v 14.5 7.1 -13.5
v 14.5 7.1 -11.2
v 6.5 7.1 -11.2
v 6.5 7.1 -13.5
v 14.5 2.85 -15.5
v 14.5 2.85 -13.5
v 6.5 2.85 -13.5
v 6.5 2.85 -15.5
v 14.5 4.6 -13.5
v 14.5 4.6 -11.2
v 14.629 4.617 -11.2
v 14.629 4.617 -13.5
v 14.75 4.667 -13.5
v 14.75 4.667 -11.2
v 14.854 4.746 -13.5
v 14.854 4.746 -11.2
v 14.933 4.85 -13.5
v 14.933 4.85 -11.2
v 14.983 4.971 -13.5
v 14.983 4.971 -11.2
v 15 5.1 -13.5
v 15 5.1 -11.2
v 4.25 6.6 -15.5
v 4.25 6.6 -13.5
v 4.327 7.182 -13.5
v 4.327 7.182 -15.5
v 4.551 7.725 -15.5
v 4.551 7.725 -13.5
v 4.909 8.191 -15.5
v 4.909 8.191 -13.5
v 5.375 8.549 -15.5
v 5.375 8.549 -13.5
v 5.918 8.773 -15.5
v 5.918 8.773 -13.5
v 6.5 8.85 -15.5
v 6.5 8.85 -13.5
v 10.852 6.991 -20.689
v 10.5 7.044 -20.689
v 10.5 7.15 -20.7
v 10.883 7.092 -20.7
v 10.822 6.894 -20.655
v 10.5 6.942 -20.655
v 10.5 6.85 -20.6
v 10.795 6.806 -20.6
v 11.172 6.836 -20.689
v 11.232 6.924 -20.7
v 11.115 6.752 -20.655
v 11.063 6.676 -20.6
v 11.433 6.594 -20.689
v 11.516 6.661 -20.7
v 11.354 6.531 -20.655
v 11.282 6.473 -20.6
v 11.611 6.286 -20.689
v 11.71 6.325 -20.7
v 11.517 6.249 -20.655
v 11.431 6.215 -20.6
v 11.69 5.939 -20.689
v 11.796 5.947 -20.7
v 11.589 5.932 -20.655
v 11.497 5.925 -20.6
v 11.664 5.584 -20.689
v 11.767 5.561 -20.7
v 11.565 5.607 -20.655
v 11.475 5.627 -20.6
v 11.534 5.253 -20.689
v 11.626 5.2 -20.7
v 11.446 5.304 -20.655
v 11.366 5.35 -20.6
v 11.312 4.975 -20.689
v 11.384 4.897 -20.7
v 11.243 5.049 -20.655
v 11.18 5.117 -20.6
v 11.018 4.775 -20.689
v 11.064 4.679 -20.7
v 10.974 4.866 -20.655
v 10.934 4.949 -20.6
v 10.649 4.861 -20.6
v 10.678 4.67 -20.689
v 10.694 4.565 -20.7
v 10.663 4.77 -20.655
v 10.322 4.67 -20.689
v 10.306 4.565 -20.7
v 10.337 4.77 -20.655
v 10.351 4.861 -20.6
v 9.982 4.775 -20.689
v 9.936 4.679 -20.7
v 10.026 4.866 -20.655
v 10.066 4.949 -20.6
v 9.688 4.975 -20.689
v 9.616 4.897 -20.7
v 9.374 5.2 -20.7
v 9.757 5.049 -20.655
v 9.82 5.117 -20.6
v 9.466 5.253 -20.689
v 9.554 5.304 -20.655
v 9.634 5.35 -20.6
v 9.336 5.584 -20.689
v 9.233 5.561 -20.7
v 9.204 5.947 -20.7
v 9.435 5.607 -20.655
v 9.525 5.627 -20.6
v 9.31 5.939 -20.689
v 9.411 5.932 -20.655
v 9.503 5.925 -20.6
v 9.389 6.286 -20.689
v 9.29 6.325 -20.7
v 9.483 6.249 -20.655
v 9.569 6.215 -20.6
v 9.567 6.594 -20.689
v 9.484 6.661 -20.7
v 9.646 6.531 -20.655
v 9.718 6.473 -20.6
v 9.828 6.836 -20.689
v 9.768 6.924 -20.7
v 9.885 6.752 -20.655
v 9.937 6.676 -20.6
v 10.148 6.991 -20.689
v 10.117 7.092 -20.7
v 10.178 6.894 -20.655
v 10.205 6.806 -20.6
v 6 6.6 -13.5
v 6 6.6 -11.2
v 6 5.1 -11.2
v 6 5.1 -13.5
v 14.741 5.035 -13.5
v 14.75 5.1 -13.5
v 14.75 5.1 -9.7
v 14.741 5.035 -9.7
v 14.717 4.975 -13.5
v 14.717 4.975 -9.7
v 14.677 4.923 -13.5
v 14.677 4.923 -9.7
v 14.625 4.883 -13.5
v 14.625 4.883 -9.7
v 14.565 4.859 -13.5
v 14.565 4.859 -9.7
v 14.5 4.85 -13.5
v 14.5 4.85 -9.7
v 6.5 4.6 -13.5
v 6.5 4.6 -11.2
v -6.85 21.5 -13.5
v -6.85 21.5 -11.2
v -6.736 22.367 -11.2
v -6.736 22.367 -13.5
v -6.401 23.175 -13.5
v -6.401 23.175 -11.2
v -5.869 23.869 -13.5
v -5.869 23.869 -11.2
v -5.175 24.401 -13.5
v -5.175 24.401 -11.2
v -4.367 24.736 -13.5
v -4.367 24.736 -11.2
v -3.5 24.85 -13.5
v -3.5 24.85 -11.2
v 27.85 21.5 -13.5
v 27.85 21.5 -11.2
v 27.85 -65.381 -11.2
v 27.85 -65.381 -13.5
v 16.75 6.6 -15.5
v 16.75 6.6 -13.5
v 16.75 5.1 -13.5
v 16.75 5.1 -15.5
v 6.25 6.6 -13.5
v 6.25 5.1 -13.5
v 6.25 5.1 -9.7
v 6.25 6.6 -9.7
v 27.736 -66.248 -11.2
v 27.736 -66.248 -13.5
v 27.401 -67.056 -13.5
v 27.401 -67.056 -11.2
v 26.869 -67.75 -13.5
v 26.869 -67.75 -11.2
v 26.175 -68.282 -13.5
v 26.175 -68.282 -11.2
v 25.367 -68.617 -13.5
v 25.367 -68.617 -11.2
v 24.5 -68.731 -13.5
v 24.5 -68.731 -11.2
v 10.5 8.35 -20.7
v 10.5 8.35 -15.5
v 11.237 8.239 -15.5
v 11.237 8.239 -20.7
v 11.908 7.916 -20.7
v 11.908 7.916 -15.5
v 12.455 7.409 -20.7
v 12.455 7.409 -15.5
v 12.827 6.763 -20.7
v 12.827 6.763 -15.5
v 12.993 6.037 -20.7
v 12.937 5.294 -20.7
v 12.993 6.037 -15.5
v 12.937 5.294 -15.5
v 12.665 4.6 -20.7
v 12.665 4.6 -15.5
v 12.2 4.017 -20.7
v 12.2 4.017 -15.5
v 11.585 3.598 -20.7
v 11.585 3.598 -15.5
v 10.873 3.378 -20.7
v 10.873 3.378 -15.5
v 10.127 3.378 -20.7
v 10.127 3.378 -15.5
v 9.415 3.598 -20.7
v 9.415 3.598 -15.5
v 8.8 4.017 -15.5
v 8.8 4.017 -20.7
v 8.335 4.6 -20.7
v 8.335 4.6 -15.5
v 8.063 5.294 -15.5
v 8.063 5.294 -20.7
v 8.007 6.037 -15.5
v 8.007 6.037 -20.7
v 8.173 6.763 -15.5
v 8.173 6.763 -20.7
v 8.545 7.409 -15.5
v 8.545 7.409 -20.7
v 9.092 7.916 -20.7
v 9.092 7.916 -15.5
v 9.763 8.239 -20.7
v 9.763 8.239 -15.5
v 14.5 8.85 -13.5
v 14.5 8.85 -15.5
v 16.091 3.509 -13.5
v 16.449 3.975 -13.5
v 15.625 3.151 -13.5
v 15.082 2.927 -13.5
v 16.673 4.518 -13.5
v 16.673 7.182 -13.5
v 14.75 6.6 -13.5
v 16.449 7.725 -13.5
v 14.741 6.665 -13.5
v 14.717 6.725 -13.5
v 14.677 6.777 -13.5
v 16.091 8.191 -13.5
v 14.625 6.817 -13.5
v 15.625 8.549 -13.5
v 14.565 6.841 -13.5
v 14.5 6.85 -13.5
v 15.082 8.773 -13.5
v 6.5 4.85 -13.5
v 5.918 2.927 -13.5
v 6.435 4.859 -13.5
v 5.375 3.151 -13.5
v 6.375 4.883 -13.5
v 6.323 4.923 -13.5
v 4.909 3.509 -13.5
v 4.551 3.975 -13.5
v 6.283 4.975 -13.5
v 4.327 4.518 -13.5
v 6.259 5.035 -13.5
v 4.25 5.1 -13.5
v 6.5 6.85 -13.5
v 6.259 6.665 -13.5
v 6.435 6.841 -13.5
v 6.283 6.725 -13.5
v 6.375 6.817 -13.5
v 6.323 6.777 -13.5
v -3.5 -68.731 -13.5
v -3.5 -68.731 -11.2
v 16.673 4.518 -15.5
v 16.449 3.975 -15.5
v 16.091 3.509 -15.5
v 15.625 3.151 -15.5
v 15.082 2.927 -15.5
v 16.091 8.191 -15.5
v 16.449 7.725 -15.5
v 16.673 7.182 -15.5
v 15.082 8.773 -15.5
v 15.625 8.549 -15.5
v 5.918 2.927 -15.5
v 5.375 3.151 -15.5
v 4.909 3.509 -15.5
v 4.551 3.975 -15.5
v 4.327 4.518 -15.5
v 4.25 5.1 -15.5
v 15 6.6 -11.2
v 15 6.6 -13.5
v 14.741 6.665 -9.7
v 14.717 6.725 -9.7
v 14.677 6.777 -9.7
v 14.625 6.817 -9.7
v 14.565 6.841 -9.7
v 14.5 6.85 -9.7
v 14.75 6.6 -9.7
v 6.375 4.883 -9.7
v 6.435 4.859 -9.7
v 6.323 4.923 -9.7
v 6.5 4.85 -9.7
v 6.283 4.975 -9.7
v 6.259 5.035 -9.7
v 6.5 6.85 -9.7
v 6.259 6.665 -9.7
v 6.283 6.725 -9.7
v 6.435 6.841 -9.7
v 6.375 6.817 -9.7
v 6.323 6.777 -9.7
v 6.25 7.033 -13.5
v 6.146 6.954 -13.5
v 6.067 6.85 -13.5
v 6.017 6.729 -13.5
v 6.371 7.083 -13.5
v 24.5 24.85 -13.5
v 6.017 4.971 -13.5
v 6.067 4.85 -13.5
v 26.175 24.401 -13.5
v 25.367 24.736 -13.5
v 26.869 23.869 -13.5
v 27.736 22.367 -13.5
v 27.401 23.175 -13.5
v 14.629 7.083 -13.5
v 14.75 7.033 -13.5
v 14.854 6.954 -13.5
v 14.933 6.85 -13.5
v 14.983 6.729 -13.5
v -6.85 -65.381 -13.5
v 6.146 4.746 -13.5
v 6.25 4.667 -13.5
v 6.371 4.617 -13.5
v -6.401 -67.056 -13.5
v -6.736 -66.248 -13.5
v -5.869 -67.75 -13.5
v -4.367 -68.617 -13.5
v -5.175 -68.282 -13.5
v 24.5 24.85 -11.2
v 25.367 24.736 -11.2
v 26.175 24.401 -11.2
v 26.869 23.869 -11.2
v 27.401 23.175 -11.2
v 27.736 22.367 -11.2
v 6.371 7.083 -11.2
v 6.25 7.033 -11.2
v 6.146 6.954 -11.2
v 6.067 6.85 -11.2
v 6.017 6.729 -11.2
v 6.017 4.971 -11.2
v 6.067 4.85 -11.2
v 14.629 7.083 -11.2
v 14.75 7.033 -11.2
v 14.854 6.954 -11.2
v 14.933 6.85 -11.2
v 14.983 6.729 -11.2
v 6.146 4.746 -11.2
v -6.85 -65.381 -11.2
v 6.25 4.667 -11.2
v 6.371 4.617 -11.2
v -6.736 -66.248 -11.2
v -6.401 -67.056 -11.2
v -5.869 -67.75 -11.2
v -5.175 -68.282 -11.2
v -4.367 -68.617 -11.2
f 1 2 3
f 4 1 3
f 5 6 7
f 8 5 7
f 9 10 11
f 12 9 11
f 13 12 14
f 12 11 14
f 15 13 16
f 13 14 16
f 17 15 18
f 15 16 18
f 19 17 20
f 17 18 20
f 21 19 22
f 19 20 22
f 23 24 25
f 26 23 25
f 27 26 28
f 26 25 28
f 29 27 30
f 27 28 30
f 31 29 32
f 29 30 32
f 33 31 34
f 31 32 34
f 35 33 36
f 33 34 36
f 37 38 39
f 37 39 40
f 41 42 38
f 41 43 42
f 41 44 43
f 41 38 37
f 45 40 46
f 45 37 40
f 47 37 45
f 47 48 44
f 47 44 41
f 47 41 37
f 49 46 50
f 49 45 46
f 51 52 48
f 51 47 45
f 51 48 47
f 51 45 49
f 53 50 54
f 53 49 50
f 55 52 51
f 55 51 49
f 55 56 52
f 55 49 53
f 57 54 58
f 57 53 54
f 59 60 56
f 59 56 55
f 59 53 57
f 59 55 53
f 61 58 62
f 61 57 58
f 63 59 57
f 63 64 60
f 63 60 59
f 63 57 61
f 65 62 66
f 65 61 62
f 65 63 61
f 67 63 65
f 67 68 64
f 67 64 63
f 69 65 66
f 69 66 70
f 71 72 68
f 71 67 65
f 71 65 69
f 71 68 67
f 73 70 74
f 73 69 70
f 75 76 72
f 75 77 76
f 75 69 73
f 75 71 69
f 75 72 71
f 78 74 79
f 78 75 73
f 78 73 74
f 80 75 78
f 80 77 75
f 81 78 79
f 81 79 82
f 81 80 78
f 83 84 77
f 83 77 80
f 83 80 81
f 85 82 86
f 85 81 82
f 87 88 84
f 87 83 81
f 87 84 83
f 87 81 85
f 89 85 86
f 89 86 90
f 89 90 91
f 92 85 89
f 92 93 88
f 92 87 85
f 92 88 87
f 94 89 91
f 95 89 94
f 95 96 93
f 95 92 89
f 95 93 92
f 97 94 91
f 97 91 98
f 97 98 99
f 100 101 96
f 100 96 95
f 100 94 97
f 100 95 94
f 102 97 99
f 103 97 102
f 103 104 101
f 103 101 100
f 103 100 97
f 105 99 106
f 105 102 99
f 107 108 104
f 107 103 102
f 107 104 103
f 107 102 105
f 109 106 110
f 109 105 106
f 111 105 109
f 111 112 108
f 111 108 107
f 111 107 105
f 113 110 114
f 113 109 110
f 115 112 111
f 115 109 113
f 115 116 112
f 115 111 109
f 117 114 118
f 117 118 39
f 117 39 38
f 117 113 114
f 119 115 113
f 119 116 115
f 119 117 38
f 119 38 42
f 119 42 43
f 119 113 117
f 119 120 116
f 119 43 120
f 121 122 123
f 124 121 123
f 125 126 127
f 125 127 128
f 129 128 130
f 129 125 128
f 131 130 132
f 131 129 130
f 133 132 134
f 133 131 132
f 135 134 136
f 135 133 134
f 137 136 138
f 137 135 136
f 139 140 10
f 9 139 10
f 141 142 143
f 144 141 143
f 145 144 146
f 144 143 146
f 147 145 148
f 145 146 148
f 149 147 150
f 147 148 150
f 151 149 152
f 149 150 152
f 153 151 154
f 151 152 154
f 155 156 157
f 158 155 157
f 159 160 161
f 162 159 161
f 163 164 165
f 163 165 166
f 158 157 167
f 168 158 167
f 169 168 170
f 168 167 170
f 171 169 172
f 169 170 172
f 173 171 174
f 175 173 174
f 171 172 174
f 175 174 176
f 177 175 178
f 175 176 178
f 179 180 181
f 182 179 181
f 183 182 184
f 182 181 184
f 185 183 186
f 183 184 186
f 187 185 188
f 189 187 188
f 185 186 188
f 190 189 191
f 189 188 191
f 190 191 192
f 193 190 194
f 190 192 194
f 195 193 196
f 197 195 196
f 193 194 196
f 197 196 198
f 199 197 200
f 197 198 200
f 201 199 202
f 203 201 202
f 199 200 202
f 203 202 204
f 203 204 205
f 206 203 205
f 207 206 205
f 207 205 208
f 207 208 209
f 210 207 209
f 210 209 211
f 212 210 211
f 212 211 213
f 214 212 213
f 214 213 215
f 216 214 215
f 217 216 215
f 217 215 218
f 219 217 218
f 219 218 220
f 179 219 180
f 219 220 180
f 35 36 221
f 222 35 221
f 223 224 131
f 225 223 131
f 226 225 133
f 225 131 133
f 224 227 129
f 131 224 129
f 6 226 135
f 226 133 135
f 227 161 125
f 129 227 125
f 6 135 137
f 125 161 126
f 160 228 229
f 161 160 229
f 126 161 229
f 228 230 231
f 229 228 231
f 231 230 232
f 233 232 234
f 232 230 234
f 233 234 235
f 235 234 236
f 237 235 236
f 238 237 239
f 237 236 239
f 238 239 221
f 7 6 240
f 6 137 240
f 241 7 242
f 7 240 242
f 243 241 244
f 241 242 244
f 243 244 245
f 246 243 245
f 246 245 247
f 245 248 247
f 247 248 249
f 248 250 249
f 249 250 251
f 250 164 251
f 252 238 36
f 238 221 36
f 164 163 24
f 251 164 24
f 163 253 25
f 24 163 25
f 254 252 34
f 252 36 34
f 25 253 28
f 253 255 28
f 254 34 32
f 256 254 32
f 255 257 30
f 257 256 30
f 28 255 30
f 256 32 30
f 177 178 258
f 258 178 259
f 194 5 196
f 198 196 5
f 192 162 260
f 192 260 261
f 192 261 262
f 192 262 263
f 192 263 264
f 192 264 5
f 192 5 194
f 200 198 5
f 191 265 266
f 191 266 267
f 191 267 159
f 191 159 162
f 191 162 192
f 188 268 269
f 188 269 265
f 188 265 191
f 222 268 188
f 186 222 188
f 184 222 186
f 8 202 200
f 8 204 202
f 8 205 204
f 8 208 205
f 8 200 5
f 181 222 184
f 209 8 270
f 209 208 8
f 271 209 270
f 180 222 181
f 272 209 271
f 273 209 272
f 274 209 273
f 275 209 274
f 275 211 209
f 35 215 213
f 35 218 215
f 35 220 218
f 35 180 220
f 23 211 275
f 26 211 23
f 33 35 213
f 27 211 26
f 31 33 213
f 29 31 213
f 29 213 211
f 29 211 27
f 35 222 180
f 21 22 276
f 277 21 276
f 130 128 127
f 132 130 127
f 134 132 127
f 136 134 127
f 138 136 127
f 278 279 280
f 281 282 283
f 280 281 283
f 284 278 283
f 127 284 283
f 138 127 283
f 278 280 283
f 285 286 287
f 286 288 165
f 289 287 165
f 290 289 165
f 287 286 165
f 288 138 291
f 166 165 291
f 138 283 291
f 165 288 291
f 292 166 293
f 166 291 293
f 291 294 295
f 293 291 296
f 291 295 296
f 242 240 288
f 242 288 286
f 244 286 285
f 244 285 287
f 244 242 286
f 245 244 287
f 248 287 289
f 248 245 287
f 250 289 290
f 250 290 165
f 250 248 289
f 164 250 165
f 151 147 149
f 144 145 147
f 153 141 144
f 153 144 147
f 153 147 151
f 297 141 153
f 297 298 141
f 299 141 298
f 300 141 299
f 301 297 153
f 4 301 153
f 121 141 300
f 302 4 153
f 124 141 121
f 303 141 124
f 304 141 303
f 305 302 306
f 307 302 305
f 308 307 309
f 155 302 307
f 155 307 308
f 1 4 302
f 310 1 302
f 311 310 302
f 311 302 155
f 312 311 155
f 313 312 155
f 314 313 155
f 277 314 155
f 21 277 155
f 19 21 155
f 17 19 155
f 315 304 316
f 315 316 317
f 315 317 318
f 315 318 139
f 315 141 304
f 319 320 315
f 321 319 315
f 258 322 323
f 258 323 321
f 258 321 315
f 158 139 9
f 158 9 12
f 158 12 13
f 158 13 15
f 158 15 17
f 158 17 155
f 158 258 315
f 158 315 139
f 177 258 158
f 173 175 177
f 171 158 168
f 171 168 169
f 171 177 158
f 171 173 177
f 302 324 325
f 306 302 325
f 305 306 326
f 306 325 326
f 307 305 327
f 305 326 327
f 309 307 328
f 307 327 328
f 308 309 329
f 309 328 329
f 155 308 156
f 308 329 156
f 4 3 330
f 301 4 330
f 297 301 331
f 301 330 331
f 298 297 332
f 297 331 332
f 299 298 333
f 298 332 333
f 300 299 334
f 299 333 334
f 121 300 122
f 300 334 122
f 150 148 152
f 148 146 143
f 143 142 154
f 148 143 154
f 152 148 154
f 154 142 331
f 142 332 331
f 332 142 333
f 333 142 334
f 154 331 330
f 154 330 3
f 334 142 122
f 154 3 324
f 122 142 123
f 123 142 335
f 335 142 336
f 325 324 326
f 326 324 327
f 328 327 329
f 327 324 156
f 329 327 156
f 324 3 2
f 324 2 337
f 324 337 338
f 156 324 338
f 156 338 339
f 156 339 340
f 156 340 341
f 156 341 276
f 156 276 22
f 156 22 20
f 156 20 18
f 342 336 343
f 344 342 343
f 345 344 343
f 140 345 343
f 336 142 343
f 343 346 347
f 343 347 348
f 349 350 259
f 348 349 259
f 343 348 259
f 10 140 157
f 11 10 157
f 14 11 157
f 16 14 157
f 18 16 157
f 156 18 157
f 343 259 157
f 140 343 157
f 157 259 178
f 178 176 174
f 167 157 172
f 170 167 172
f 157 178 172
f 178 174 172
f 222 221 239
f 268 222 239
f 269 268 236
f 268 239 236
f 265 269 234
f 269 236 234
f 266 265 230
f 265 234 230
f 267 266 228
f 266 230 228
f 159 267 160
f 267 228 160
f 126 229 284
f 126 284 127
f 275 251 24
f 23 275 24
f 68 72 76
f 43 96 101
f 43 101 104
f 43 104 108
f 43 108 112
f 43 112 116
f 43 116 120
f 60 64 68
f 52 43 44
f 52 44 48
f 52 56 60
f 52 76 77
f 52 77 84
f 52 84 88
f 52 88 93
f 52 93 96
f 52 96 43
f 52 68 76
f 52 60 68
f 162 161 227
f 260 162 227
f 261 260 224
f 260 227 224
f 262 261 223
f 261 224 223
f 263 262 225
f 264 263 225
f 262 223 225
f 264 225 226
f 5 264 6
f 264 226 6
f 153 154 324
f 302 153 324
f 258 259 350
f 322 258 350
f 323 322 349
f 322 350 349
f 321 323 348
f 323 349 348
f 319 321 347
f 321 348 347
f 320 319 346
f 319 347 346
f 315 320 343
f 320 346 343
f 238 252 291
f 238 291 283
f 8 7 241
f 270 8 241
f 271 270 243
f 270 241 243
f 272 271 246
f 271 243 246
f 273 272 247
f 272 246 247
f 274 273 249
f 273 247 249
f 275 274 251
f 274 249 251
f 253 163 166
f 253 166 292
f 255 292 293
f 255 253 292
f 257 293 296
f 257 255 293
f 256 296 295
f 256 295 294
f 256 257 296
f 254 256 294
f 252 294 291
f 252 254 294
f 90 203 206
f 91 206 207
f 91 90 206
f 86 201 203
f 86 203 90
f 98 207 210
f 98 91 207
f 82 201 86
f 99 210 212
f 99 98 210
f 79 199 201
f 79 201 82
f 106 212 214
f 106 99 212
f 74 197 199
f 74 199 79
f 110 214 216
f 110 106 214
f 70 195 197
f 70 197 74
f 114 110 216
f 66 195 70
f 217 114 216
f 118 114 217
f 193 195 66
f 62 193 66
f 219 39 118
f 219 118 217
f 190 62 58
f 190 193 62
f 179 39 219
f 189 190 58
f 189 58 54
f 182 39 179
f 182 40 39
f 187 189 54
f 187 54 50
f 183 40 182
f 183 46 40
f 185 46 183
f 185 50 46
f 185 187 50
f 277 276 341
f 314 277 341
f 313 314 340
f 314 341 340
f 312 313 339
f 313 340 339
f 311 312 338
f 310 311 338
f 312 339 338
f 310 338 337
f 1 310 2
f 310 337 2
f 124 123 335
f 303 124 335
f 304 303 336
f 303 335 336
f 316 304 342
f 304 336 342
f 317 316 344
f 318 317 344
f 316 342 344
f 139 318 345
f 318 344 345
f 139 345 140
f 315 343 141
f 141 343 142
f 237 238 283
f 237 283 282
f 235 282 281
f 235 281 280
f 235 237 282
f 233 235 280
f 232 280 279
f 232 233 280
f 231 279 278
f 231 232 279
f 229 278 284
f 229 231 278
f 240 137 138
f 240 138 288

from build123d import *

# Parameters (mm, degrees)
STOCK_PB_TOP_LID_SM_1_START = 11.200003695
STOCK_PB_TOP_LID_SM_1_DEPTH = 2.3
BOSS_EXTRUDE1_DEPTH         = 3.8
BOSS_EXTRUDE2_DEPTH         = 2
SKETCH5_R                   = 2.5
BOSS_EXTRUDE3_DEPTH         = 5.2
SKETCH6_R                   = 1
CUT_EXTRUDE1_DEPTH          = 0.1
FILLET1_R                   = 0.5


# Read off the part's stored shape, not the designer's step: Stock-pb_top_lid_sm-1
with BuildPart() as part:
    # Stock-pb_top_lid_sm-1 outline → Stock-pb_top_lid_sm-1 (new body)
    with BuildSketch(Plane(origin=(0, 0, 0), x_dir=(1, 0, 0), z_dir=(0, 1.3113422028449806e-07, -0.9999999999999915)).offset(STOCK_PB_TOP_LID_SM_1_START)):
        with BuildLine():
            Line((-3.5, -24.849998248), (24.5, -24.849998482))
            ThreePointArc((24.5, -24.849998482), (26.868807895, -23.868806125), (27.850000252, -21.49999823))
            Line((27.850000252, -21.49999823), (27.85, 65.381136149))
            ThreePointArc((27.85, 65.381136149), (26.868807717, 67.749943866), (24.5, 68.731136149))
            Line((24.5, 68.731136149), (-3.5, 68.731136149))
            ThreePointArc((-3.5, 68.731136149), (-5.868807606, 67.749943977), (-6.85, 65.381136463))
            Line((-6.85, 65.381136463), (-6.850000018, -21.49999823))
            ThreePointArc((-6.850000018, -21.49999823), (-5.86880773, -23.86880596), (-3.5, -24.849998248))
        make_face()
        with BuildLine():
            ThreePointArc((14.500000108, -4.599998248), (14.853553499, -4.746444857), (15.000000108, -5.099998248))
            Line((15.000000108, -5.099998248), (15.000000108, -6.599997786))
            ThreePointArc((15.000000108, -6.599997786), (14.853553662, -6.953551475), (14.500000108, -7.099998248))
            Line((14.500000108, -7.099998248), (6.500000108, -7.099998248))
            ThreePointArc((6.500000108, -7.099998248), (6.146446718, -6.953551638), (6.000000108, -6.599998248))
            Line((6.000000108, -6.599998248), (6.000000108, -5.099998248))
            ThreePointArc((6.000000108, -5.099998248), (6.146446717, -4.746444858), (6.500000108, -4.599998248))
            Line((6.500000108, -4.599998248), (14.500000108, -4.599998248))
        make_face(mode=Mode.SUBTRACT)
    extrude(amount=STOCK_PB_TOP_LID_SM_1_DEPTH)


with BuildPart() as body_2:
    # Sketch3 → Boss-Extrude1 (new body)
    with BuildSketch(Plane(origin=(0, 1.77e-06, -13.500003695), x_dir=(-1, 0, 0), z_dir=(0, 1.3113422028449777e-07, -0.9999999999999915))):
        with BuildLine():
            Line((-14.500000108, 4.849998248), (-6.500000108, 4.849998248))
            ThreePointArc((-6.500000108, 4.849998248), (-6.323223413, 4.923221552), (-6.250000108, 5.099998248))
            Line((-6.250000108, 5.099998248), (-6.250000108, 6.599998248))
            ThreePointArc((-6.250000108, 6.599998248), (-6.323223413, 6.776774943), (-6.500000108, 6.849998248))
            Line((-6.500000108, 6.849998248), (-14.500000108, 6.849998248))
            ThreePointArc((-14.500000108, 6.849998248), (-14.676776803, 6.776774943), (-14.750000108, 6.599998248))
            Line((-14.750000108, 6.599998248), (-14.750000108, 5.099998248))
            ThreePointArc((-14.750000108, 5.099998248), (-14.676776803, 4.923221552), (-14.500000108, 4.849998248))
        make_face()
    extrude(amount=-BOSS_EXTRUDE1_DEPTH)

    # Sketch4 → Boss-Extrude2 (add)
    with BuildSketch(Plane(origin=(0, 1.77e-06, -13.500003695), x_dir=(-1, 0, 0), z_dir=(0, 1.311342202844978e-07, -0.9999999999999915))):
        with BuildLine():
            Line((-4.250000108, 5.099998248), (-4.250000108, 6.599998248))
            ThreePointArc((-4.250000108, 6.599998248), (-4.909009851, 8.190988505), (-6.500000108, 8.849998248))
            Line((-6.500000108, 8.849998248), (-14.500000108, 8.849998248))
            ThreePointArc((-14.500000108, 8.849998248), (-16.090990366, 8.190988505), (-16.750000108, 6.599998248))
            Line((-16.750000108, 6.599998248), (-16.750000108, 5.099998248))
            ThreePointArc((-16.750000108, 5.099998248), (-16.090990366, 3.50900799), (-14.500000108, 2.849998248))
            Line((-14.500000108, 2.849998248), (-6.500000108, 2.849998248))
            ThreePointArc((-6.500000108, 2.849998248), (-4.909009851, 3.50900799), (-4.250000108, 5.099998248))
        make_face()
    extrude(amount=BOSS_EXTRUDE2_DEPTH)

    # Sketch5 → Boss-Extrude3 (add)
    with BuildSketch(Plane(origin=(0, 2.033e-06, -15.500003695), x_dir=(-1, 0, 0), z_dir=(0, 1.3113422028449782e-07, -0.9999999999999915))):
        with Locations(Location((-10.500000108, 5.849998248, 0), (0, 0, 90))):
            Circle(SKETCH5_R)
    extrude(amount=BOSS_EXTRUDE3_DEPTH)

    # Sketch6 → Cut-Extrude1 (cut)
    with BuildSketch(Plane(origin=(0, 2.714e-06, -20.700003695), x_dir=(-1, 0, 0), z_dir=(0, 1.3113422028449785e-07, -0.9999999999999915))):
        with Locations(Location((-10.500000108, 5.849998248, 0), (0, 0, 90))):
            Circle(SKETCH6_R)
    extrude(amount=-CUT_EXTRUDE1_DEPTH, mode=Mode.SUBTRACT)

    # Fillet1
    # the kernel refuses this fillet: 0.5 mm, written as the material it takes off along each edge
    with BuildSketch(Plane(origin=(10.500000108, 5.850000962, -20.700002928), x_dir=(0, 0.9999999999999915, 1.3113421815091902e-07), z_dir=(-1, 0, 0))) as fillet1_piece_1:
        with BuildLine():
            CenterArc((1.3, -0.5), FILLET1_R, 90, 36.869897646)
            Line((1, -0.1), (0.994, -0.092))
            ThreePointArc((0.994, -0.092), (0.99, -0.05), (0.99, 0))
            Line((0.99, 0), (1, 0.01))
            Line((1, 0.01), (1.3, 0.01))
            Line((1.3, 0.01), (1.3, 0))
        make_face()
    revolve(axis=Axis((10.500000108, 5.850000962, -20.700002928), (0, 1.3113422028449785e-07, -0.9999999999999915)), mode=Mode.SUBTRACT)


solid = Compound([part.part, body_2.part])
